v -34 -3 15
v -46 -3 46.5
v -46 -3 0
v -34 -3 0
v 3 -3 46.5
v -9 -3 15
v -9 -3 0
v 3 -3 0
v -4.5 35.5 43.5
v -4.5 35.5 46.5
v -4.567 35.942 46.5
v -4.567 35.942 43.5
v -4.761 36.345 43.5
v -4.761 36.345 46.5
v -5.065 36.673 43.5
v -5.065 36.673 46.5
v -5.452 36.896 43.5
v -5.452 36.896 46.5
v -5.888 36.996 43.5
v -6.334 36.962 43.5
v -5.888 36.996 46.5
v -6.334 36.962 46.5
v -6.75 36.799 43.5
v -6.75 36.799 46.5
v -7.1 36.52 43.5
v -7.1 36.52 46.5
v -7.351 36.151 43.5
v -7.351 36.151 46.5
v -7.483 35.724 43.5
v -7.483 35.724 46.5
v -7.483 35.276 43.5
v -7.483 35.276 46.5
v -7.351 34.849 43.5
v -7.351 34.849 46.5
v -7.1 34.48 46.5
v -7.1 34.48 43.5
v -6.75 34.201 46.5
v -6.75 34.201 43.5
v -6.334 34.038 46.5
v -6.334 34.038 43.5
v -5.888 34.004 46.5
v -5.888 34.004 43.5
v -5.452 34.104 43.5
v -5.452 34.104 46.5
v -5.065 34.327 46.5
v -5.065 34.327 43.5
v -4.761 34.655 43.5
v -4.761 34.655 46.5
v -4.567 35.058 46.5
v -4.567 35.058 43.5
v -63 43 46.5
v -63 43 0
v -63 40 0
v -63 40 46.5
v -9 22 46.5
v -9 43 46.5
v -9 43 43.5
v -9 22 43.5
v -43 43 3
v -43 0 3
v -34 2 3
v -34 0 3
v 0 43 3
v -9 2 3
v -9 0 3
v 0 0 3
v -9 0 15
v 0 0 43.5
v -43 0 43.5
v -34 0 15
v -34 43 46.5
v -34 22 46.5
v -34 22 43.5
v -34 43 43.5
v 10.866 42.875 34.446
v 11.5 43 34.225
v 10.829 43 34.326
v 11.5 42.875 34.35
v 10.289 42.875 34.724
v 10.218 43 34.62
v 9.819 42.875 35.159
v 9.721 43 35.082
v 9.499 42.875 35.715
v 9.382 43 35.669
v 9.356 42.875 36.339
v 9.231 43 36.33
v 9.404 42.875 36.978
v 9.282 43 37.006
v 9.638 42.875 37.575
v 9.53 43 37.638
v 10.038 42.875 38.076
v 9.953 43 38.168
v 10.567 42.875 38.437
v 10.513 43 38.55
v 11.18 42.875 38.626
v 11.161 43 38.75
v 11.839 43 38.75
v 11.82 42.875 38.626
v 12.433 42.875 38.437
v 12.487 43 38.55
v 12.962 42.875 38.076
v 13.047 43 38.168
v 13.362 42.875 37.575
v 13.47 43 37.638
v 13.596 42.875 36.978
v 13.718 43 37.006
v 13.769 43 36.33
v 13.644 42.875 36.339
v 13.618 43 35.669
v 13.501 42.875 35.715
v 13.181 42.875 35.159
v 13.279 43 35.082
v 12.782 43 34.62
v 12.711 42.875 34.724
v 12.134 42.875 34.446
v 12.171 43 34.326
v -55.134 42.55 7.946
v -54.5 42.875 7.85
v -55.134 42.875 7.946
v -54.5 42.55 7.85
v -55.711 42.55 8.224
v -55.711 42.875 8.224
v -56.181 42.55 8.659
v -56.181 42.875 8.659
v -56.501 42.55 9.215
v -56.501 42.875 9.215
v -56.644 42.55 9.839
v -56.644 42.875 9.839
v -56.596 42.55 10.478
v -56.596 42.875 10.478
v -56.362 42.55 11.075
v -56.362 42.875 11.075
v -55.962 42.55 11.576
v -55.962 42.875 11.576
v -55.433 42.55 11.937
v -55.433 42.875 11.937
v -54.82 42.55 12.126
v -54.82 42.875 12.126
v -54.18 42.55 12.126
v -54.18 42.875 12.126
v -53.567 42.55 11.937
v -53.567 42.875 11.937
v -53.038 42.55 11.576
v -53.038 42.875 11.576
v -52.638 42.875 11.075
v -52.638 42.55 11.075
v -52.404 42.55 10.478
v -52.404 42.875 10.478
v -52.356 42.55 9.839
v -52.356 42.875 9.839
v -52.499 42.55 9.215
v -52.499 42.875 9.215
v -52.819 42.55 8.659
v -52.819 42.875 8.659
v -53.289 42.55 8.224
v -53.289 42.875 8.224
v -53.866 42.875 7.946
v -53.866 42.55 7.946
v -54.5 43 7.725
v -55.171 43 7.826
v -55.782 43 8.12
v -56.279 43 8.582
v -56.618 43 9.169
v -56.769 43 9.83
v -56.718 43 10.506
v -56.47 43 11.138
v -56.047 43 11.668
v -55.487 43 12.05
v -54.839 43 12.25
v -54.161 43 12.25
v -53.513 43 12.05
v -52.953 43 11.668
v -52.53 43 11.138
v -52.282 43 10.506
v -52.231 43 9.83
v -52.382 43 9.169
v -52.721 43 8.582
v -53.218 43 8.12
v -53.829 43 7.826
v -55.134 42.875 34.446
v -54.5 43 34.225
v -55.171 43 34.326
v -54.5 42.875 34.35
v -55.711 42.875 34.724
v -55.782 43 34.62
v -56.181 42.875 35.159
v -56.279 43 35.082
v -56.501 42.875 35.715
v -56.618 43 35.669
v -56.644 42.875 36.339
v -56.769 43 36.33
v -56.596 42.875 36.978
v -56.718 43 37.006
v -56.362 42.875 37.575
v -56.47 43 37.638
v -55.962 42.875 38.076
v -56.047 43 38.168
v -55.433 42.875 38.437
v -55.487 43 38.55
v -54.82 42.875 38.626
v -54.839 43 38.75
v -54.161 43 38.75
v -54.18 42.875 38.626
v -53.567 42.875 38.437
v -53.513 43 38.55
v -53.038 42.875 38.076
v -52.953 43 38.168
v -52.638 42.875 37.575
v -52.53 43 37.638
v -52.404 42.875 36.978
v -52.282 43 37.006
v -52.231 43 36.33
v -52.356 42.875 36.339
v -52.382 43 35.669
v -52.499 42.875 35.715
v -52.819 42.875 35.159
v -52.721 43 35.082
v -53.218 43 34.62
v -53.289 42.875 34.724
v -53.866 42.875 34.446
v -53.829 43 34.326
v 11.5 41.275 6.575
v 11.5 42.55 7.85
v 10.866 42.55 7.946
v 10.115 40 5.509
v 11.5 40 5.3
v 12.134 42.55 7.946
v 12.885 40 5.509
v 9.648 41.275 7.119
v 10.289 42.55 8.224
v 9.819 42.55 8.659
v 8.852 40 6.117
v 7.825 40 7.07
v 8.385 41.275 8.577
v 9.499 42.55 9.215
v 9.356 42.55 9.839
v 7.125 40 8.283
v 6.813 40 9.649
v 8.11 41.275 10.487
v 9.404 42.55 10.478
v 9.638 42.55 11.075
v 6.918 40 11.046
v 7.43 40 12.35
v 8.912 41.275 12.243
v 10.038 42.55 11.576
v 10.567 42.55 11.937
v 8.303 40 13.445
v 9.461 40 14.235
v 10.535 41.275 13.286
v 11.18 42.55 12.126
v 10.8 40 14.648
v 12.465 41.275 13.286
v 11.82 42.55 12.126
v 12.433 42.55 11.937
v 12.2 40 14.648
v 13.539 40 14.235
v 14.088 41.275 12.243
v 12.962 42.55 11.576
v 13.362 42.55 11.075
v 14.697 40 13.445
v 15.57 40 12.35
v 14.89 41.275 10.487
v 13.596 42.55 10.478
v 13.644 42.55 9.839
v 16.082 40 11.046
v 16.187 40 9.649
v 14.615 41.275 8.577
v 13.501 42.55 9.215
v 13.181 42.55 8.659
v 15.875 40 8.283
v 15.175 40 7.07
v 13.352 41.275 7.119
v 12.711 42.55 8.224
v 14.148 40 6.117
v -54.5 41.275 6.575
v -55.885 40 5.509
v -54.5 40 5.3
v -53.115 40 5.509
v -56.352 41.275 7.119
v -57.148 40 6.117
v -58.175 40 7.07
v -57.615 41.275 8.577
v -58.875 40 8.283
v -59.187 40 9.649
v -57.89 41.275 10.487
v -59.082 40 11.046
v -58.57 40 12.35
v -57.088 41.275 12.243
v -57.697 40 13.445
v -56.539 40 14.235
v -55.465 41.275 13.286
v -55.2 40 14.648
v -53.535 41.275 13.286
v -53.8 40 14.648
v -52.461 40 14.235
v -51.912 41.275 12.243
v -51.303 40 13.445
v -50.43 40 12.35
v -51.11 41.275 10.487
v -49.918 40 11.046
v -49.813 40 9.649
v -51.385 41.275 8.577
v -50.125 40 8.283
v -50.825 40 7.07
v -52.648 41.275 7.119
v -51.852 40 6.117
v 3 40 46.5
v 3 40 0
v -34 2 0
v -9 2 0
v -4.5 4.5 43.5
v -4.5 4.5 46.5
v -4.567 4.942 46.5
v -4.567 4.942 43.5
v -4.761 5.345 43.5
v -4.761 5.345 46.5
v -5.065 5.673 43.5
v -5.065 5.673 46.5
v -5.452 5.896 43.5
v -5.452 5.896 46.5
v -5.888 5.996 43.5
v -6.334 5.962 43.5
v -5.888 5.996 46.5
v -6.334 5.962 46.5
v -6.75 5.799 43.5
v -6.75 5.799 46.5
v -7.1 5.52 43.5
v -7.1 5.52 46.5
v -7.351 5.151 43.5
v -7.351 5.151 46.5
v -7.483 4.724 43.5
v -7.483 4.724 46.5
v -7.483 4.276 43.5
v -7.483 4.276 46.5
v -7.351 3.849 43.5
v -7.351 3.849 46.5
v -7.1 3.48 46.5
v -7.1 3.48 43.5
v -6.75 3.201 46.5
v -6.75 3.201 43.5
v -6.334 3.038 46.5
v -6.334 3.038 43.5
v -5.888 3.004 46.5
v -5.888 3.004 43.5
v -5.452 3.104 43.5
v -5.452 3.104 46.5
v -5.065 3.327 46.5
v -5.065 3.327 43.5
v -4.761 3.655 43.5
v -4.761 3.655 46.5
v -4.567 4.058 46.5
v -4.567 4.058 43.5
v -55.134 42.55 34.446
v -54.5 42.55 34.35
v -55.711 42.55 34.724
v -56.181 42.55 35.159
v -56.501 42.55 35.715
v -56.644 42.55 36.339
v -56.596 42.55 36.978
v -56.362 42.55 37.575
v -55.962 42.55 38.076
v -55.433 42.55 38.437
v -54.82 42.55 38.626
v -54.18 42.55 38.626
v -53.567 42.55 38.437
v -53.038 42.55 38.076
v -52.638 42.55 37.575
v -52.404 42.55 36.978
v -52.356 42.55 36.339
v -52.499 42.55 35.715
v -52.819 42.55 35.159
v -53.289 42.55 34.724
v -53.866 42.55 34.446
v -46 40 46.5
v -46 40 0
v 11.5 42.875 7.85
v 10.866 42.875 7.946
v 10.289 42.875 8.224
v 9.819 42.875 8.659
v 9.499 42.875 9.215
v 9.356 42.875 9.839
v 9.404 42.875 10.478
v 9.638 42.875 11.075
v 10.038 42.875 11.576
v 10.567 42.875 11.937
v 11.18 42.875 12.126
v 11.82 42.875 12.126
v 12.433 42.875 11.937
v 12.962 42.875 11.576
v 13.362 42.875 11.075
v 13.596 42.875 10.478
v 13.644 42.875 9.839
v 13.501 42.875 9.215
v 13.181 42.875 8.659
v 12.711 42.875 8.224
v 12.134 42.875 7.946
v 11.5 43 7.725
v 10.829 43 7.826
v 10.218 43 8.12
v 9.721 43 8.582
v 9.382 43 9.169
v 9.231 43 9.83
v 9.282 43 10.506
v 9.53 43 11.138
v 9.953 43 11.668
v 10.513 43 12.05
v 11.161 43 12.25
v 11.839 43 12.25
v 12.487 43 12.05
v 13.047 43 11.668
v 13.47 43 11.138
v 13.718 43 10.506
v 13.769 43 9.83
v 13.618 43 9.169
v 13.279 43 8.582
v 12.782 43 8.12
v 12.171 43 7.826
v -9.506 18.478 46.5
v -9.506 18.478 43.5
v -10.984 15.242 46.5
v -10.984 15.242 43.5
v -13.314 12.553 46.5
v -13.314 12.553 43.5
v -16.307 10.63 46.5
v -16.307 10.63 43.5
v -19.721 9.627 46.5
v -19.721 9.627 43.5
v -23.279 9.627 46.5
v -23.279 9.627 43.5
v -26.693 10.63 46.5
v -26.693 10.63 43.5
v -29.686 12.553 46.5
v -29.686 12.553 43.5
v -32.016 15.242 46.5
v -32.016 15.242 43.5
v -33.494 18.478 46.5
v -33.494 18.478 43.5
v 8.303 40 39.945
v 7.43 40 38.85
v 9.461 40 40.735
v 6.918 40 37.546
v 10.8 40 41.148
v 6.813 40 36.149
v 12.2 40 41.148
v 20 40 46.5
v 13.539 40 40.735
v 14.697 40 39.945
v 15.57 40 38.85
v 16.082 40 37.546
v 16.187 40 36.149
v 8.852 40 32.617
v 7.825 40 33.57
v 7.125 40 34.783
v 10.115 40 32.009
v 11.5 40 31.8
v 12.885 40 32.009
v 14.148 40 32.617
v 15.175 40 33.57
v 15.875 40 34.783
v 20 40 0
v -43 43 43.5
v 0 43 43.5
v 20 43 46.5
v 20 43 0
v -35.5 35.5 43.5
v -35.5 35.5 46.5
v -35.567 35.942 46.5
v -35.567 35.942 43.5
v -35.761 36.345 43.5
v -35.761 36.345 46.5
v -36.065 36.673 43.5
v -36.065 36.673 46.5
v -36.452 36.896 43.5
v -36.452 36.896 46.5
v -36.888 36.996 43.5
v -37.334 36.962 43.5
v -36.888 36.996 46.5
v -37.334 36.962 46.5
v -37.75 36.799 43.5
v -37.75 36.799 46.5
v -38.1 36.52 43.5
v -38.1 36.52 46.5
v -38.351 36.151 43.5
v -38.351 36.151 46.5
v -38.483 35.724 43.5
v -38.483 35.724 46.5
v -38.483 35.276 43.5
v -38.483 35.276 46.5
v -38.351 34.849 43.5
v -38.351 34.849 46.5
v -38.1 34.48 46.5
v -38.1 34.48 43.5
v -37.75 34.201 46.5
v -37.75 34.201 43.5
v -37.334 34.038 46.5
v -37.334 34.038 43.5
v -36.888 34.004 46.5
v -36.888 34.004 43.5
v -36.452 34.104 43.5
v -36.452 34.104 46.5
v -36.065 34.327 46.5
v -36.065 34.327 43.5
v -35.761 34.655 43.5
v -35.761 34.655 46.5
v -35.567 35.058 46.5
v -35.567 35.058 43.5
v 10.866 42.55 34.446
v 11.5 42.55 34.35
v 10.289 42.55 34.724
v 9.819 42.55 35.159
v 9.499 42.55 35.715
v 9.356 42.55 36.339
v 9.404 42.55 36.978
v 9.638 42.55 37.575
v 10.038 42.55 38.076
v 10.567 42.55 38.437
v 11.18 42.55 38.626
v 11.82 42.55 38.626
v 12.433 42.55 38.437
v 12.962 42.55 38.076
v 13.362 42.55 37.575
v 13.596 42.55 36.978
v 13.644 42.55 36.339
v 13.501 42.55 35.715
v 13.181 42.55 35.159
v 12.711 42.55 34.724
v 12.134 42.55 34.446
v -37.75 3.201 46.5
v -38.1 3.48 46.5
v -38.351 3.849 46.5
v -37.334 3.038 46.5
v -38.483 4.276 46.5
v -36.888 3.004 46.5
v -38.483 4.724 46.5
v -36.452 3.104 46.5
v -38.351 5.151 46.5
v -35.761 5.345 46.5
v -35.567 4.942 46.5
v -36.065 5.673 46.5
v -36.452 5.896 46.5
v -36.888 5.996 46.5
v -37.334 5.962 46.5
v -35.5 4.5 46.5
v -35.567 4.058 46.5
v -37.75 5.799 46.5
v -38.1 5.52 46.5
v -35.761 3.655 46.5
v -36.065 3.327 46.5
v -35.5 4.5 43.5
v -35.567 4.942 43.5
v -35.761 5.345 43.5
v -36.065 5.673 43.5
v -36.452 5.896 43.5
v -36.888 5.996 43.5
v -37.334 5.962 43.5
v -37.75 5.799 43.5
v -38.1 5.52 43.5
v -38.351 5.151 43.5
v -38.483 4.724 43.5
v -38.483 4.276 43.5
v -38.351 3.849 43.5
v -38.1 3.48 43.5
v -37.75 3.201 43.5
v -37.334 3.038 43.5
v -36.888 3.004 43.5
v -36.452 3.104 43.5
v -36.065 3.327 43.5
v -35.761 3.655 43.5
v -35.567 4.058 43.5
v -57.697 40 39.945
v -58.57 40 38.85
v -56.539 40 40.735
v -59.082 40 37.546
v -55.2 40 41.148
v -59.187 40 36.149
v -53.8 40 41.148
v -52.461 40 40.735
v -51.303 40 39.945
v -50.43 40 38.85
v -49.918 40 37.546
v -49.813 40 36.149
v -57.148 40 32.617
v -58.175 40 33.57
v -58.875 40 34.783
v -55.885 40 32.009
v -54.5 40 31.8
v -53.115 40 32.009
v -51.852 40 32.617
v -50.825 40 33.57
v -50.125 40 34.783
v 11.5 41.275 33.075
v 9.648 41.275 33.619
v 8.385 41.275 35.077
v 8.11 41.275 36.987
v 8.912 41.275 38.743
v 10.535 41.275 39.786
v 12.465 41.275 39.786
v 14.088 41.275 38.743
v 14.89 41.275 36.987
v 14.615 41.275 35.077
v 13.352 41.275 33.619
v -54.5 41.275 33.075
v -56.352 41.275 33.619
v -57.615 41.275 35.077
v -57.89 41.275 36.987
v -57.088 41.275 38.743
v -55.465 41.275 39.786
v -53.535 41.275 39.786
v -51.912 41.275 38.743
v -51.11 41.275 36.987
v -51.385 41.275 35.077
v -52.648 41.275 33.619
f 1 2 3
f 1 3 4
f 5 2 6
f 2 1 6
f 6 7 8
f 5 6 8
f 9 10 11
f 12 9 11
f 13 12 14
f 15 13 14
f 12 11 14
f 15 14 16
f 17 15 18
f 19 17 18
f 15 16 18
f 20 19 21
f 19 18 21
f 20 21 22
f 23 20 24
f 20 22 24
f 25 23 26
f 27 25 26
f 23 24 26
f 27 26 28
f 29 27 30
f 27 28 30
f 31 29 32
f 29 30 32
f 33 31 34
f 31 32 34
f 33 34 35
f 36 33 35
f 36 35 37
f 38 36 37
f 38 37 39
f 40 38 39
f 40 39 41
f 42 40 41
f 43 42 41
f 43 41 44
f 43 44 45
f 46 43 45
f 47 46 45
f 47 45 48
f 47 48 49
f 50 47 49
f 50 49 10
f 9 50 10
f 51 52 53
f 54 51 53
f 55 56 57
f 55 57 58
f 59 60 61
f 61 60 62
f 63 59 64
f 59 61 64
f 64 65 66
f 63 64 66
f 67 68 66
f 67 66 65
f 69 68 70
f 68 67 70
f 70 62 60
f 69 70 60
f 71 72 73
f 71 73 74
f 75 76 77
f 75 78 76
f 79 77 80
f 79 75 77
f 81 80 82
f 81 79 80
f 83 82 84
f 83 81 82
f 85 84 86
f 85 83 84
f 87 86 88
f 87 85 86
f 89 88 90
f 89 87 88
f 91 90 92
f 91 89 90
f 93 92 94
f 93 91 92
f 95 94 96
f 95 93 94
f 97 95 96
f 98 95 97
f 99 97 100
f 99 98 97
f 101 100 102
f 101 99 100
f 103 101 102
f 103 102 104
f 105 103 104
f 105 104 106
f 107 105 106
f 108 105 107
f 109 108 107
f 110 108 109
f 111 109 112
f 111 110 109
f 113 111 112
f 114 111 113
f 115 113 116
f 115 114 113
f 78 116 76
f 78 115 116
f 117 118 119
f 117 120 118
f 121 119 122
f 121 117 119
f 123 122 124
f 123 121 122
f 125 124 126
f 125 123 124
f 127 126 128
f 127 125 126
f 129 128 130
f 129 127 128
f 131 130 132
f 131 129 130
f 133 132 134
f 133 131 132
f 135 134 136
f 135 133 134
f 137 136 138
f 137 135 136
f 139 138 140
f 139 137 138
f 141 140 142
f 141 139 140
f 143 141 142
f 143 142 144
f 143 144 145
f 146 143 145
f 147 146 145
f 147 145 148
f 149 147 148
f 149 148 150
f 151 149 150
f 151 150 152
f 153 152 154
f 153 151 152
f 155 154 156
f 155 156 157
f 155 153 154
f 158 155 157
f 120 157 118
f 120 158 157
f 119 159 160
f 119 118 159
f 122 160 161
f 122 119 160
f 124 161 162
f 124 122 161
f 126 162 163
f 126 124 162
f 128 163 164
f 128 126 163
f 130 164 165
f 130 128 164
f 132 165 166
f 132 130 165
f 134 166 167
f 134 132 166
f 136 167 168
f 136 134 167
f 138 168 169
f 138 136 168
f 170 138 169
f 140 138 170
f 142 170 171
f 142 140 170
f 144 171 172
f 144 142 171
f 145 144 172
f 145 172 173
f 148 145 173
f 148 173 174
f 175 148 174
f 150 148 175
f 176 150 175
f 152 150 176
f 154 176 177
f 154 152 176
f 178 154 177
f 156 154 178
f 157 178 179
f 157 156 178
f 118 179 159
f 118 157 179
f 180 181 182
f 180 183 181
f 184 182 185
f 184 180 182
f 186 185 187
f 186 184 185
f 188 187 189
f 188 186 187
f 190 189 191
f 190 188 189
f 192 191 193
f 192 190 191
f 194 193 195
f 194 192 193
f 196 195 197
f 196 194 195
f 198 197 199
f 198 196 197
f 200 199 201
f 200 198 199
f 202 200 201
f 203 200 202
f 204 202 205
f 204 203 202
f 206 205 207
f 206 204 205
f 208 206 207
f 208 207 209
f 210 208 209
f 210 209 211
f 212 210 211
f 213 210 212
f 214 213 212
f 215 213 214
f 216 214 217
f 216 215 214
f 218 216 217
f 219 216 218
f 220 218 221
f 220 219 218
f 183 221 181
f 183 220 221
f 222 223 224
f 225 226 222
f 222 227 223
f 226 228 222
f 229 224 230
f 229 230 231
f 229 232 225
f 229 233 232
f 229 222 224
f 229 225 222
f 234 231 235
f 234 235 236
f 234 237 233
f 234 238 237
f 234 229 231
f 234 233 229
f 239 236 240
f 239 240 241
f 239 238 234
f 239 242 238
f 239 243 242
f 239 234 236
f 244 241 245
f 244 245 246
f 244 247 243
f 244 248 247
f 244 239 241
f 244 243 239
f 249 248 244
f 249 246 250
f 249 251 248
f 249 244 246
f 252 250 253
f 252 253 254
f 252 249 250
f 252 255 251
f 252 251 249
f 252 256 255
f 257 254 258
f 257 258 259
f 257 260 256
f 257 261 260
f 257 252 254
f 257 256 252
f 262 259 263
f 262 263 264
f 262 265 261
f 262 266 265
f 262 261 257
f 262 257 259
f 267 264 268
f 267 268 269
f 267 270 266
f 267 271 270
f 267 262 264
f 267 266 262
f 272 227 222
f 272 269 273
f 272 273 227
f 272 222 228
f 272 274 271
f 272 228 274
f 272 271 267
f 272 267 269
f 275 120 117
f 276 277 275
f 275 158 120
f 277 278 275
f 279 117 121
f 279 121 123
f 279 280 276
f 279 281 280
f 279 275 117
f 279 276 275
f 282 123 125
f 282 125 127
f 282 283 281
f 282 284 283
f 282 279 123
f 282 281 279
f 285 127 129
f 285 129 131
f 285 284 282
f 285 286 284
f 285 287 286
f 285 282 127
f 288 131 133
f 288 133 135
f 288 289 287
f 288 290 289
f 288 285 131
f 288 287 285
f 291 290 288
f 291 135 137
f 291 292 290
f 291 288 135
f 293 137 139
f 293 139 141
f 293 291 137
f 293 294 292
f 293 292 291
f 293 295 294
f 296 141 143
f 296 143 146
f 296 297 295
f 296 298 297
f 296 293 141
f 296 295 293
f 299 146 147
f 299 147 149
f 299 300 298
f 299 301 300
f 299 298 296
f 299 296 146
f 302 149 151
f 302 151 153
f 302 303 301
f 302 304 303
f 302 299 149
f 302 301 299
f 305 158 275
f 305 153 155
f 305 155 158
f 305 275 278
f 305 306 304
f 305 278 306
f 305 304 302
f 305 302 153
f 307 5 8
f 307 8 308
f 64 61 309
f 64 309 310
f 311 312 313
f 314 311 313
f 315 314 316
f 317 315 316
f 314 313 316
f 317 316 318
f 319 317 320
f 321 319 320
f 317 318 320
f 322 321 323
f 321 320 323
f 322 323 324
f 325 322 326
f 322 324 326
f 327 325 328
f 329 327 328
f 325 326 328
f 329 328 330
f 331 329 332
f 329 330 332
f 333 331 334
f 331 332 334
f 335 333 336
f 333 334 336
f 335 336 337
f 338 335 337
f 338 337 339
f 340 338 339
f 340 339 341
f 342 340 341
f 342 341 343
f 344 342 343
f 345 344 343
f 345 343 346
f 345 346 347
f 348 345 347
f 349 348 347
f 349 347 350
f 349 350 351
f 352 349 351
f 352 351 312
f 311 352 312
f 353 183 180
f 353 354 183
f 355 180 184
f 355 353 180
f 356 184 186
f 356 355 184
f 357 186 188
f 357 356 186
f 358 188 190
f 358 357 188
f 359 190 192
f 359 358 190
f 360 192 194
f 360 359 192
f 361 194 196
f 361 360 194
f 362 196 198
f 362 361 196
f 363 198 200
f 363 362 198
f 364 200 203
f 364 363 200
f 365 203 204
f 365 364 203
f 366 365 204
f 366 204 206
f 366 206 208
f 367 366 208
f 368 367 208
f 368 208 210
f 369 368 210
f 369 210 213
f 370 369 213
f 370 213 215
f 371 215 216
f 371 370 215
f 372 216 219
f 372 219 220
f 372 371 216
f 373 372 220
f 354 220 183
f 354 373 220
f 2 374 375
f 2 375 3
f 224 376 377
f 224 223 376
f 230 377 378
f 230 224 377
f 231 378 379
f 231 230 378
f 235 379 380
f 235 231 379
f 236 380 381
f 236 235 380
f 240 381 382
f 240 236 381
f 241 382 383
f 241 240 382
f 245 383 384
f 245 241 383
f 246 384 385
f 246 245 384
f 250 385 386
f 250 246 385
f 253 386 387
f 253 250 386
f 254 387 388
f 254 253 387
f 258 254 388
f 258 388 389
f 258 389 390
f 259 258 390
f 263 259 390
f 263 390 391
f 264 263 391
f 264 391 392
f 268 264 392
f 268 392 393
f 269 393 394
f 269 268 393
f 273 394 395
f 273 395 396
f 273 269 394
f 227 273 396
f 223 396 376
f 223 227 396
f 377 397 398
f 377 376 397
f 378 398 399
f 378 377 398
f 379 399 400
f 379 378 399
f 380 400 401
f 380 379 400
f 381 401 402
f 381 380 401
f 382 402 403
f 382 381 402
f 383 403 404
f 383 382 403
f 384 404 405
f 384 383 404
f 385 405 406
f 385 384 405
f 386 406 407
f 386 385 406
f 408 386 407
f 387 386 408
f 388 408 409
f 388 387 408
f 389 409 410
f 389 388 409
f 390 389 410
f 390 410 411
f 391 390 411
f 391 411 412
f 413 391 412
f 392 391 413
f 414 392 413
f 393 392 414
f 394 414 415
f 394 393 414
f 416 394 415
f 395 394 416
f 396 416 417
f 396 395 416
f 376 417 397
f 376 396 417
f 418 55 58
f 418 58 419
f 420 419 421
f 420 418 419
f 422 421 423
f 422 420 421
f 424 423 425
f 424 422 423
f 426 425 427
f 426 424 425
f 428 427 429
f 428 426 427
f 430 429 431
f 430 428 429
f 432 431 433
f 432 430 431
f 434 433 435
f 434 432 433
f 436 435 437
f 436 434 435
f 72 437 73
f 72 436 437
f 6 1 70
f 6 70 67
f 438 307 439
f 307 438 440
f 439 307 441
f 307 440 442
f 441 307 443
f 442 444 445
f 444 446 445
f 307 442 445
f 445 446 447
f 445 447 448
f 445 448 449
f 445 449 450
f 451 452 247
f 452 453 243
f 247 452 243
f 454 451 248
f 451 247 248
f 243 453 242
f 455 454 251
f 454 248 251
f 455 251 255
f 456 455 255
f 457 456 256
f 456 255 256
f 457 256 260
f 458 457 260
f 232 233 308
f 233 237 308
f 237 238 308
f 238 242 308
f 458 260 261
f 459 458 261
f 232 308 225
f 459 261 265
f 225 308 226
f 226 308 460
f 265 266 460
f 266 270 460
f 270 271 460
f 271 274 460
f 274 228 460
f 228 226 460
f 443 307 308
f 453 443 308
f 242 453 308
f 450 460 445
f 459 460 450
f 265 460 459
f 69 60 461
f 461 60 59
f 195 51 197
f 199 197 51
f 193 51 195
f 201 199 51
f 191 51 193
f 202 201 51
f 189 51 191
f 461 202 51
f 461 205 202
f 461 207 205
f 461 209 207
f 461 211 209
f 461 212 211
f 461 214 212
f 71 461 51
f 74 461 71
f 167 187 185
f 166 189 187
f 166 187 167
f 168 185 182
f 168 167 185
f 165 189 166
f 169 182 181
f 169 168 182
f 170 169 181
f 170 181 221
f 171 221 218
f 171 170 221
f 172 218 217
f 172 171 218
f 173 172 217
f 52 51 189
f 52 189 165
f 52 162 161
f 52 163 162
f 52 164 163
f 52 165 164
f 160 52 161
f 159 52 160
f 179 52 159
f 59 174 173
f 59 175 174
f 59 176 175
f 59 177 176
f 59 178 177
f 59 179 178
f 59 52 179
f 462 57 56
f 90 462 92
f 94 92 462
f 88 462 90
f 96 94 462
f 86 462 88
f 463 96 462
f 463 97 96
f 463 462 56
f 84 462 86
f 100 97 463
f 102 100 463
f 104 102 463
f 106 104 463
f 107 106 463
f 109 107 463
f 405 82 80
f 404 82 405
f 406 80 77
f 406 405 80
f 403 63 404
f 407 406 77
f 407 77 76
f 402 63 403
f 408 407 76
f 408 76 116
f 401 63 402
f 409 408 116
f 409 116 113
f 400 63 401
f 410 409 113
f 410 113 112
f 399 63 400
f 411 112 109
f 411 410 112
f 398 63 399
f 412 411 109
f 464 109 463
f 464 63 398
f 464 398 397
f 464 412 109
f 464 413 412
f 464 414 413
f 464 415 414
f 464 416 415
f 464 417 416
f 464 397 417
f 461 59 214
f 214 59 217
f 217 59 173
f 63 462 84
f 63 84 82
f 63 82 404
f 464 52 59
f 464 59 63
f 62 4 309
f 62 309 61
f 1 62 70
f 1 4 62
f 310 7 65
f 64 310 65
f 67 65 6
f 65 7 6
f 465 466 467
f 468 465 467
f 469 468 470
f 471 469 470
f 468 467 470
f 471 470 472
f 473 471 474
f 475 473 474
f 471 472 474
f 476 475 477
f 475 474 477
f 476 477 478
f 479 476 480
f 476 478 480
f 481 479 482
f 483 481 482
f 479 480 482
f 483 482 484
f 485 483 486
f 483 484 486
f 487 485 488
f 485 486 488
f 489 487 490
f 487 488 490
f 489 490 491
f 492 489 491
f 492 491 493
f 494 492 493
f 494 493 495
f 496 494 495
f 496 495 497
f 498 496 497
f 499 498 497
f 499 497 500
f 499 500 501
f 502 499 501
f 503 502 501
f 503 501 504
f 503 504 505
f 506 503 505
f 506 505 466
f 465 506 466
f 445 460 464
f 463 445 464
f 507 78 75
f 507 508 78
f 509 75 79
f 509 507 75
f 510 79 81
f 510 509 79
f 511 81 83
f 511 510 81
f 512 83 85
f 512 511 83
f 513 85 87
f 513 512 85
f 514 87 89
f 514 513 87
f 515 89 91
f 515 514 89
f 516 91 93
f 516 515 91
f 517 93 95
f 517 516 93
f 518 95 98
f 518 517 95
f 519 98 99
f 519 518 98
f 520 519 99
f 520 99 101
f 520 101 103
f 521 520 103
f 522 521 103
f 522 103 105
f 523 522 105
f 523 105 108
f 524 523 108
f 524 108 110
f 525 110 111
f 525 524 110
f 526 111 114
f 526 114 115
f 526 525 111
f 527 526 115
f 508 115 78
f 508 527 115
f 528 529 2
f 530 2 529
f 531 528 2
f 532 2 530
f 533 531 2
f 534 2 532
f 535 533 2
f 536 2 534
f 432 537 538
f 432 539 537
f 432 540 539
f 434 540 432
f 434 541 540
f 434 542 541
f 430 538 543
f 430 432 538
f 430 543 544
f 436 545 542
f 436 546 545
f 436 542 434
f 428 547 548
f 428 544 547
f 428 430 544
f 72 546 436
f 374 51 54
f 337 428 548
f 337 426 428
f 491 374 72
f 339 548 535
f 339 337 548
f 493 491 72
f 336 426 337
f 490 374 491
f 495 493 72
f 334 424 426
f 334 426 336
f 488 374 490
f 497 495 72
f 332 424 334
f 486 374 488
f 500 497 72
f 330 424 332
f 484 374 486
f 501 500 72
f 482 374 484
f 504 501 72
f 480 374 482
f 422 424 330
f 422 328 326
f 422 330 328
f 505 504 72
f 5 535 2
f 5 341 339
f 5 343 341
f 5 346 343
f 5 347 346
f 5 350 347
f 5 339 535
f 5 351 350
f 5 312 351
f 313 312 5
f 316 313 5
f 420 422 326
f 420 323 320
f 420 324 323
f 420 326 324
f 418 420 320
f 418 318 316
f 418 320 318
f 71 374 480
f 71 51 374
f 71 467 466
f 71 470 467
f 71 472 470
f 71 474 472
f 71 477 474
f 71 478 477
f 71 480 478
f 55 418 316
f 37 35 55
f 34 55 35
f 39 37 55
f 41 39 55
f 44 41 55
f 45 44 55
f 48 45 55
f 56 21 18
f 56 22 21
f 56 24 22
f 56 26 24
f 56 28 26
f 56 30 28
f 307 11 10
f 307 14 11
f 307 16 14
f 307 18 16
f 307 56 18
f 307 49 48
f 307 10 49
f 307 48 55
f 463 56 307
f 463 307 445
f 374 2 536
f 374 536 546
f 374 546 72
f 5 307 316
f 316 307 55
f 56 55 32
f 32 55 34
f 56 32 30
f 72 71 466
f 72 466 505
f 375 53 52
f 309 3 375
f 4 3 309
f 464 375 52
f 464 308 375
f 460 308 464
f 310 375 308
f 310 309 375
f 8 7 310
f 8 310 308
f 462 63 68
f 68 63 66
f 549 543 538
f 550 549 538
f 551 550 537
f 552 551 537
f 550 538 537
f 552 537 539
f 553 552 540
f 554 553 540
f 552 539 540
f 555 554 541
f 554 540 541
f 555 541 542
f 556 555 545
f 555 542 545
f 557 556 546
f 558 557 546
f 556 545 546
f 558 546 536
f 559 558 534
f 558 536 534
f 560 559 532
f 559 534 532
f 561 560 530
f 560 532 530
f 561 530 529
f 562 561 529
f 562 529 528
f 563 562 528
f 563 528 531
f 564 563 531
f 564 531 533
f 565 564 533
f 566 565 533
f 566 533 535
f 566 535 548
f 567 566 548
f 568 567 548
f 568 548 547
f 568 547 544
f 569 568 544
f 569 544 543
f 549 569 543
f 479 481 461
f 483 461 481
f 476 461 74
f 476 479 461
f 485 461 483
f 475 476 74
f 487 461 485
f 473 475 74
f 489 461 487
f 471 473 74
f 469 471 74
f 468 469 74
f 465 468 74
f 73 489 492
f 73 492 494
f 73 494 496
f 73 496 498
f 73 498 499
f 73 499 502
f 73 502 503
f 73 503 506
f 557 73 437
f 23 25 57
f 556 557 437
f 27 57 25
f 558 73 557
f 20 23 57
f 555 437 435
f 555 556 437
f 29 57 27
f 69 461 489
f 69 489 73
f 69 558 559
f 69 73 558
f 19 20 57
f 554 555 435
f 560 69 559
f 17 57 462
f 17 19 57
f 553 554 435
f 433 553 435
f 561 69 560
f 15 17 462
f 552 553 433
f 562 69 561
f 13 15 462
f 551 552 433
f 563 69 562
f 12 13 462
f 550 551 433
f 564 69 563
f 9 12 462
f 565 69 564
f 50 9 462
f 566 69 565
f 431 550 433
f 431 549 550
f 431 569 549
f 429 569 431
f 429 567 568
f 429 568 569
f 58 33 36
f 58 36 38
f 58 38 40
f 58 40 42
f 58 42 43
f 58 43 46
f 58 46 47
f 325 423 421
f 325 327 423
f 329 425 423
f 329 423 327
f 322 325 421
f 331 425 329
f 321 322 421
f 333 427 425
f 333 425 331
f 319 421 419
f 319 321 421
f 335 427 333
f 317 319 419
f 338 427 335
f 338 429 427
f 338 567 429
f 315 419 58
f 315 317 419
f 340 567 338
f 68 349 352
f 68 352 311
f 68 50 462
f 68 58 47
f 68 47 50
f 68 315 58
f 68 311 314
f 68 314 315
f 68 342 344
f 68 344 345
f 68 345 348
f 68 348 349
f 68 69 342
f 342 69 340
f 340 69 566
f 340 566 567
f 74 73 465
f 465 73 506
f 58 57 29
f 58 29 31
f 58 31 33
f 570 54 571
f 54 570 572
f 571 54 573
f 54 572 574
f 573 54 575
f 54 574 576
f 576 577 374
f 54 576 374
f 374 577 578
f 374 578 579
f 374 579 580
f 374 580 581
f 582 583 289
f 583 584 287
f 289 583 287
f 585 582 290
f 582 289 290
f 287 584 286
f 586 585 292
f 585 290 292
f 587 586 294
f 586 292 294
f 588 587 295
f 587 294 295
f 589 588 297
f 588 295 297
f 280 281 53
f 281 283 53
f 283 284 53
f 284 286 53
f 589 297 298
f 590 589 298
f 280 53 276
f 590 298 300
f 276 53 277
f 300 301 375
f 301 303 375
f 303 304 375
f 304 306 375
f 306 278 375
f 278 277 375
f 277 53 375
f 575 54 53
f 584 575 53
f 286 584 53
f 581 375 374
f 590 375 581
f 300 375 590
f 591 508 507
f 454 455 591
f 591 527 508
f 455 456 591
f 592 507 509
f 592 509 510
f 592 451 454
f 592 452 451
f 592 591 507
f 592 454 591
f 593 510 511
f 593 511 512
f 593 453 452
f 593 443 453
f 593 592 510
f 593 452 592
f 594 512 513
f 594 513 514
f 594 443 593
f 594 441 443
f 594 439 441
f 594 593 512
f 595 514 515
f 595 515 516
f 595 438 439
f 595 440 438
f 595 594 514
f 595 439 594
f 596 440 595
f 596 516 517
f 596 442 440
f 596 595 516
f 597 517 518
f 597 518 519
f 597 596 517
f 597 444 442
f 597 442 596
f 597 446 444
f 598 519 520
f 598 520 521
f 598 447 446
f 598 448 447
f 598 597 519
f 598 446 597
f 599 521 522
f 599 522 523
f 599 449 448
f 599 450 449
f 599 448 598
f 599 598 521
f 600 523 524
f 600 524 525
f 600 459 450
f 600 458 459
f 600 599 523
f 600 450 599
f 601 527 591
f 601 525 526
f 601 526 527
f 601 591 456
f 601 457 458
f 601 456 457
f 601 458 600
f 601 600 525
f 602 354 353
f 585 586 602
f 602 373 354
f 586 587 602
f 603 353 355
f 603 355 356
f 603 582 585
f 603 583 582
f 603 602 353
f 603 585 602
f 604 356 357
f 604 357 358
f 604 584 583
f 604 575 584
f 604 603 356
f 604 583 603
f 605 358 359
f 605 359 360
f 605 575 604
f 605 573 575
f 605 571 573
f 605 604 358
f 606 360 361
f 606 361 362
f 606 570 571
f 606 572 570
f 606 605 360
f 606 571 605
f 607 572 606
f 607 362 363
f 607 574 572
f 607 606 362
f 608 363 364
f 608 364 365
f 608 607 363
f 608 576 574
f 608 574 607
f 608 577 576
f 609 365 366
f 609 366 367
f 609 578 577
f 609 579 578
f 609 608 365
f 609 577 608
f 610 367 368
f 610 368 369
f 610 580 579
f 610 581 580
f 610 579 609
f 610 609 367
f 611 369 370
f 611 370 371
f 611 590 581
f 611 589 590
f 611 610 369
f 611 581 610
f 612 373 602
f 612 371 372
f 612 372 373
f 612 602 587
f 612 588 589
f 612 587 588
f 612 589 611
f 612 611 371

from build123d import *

# Parameters (mm, degrees)
EXTRU_MINCE1_DEPTH                          = 46.5
ESQUISSE2_W                                 = 43
ESQUISSE2_H                                 = 3
BOSS_EXTRU_1_DEPTH                          = 43
ENL_V_MAT_EXTRU_1_REACH                     = 48.5
ESQUISSE3_R                                 = 1.5
FRAISAGE_POUR_VIS_T_TE_FRAIS_E_M41_AT_COUNT = 2
FRAISAGE_POUR_VIS_T_TE_FRAIS_E_M41_AT_PITCH = 71.121375127
FRAISAGE_POUR_VIS_T_TE_FRAIS_E_M41_2_COUNT  = 2
FRAISAGE_POUR_VIS_T_TE_FRAIS_E_M41_2_PITCH  = 66
FRAISAGE_POUR_VIS_T_TE_FRAIS_E_M41_3_COUNT  = 2
FRAISAGE_POUR_VIS_T_TE_FRAIS_E_M41_3_PITCH  = 26.5
ESQUISSE6_W                                 = 25
ESQUISSE6_H                                 = 15
ENL_V_MAT_EXTRU_2_DEPTH                     = 5


with BuildPart() as part:
    # Esquisse1 → Extru.-Mince1 (new body)
    with BuildSketch(Plane.XY):
        Polygon((20, 43), (0, 43), (0, 0), (-43, 0), (-43, 43), (-63, 43), (-63, 40), (-46, 40), (-46, -3), (3, -3), (3, 40), (20, 40), align=None)
    extrude(amount=EXTRU_MINCE1_DEPTH)

    # Esquisse2 → Boss.-Extru.1 (add)
    with BuildSketch(Plane(origin=(0, 0, 0), x_dir=(1, 0, 0), z_dir=(0, 1, 0))):
        with Locations((-21.5, -1.5)):
            Rectangle(ESQUISSE2_W, ESQUISSE2_H)
        with Locations((-21.5, -45)):
            Rectangle(ESQUISSE2_W, ESQUISSE2_H)
    extrude(amount=BOSS_EXTRU_1_DEPTH)

    # Esquisse3 → Enlèv. mat.-Extru.1 (cut, up to next)
    with BuildSketch(Plane.XY.offset(46.5), mode=Mode.PRIVATE) as enl_v_mat_extru_1_sk1:
        with Locations((-37, 4.5)):
            Circle(ESQUISSE3_R)
    enl_v_mat_extru_1_tool1 = extrude(enl_v_mat_extru_1_sk1.sketch, amount=-ENL_V_MAT_EXTRU_1_REACH, mode=Mode.PRIVATE) & part.part
    add(enl_v_mat_extru_1_tool1.solids().sort_by_distance((-37, 4.5, 46.5))[0], mode=Mode.SUBTRACT)
    # Esquisse3 → Enlèv. mat.-Extru.1 (cut, up to next)
    with BuildSketch(Plane.XY.offset(46.5), mode=Mode.PRIVATE) as enl_v_mat_extru_1_sk2:
        with Locations((-37, 35.5)):
            Circle(ESQUISSE3_R)
    enl_v_mat_extru_1_tool2 = extrude(enl_v_mat_extru_1_sk2.sketch, amount=-ENL_V_MAT_EXTRU_1_REACH, mode=Mode.PRIVATE) & part.part
    add(enl_v_mat_extru_1_tool2.solids().sort_by_distance((-37, 35.5, 46.5))[0], mode=Mode.SUBTRACT)
    # Esquisse3 → Enlèv. mat.-Extru.1 (cut, up to next)
    with BuildSketch(Plane.XY.offset(46.5), mode=Mode.PRIVATE) as enl_v_mat_extru_1_sk3:
        with Locations((-6, 35.5)):
            Circle(ESQUISSE3_R)
    enl_v_mat_extru_1_tool3 = extrude(enl_v_mat_extru_1_sk3.sketch, amount=-ENL_V_MAT_EXTRU_1_REACH, mode=Mode.PRIVATE) & part.part
    add(enl_v_mat_extru_1_tool3.solids().sort_by_distance((-6, 35.5, 46.5))[0], mode=Mode.SUBTRACT)
    # Esquisse3 → Enlèv. mat.-Extru.1 (cut, up to next)
    with BuildSketch(Plane.XY.offset(46.5), mode=Mode.PRIVATE) as enl_v_mat_extru_1_sk4:
        with Locations((-6, 4.5)):
            Circle(ESQUISSE3_R)
    enl_v_mat_extru_1_tool4 = extrude(enl_v_mat_extru_1_sk4.sketch, amount=-ENL_V_MAT_EXTRU_1_REACH, mode=Mode.PRIVATE) & part.part
    add(enl_v_mat_extru_1_tool4.solids().sort_by_distance((-6, 4.5, 46.5))[0], mode=Mode.SUBTRACT)
    # Esquisse3 → Enlèv. mat.-Extru.1 (cut, up to next)
    with BuildSketch(Plane.XY.offset(46.5), mode=Mode.PRIVATE) as enl_v_mat_extru_1_sk5:
        with BuildLine():
            Line((-34, 43), (-9, 43))
            Line((-9, 43), (-9, 22))
            ThreePointArc((-9, 22), (-21.5, 9.5), (-34, 22))
            Line((-34, 22), (-34, 43))
        make_face()
    enl_v_mat_extru_1_tool5 = extrude(enl_v_mat_extru_1_sk5.sketch, amount=-ENL_V_MAT_EXTRU_1_REACH, mode=Mode.PRIVATE) & part.part
    add(enl_v_mat_extru_1_tool5.solids().sort_by_distance((-21.5, 27.464973, 46.5))[0], mode=Mode.SUBTRACT)

    # Esquisse5 → Fraisage pour vis à tête fraisée M41 (revolve, cut)
    with BuildSketch(Plane(origin=(-54.5, 40, 36.5), x_dir=(0, 0, -1), z_dir=(1, 0, 0))):
        Polygon((0, 0), (0, 3), (2.275, 3), (2.15, 2.875), (2.15, 2.55), (4.7, 0), align=None)
    fraisage_pour_vis_t_te_frais_e_m41 = revolve(axis=Axis((-54.5, 33.65, 36.5), (0, 1, 0)), mode=Mode.SUBTRACT)

    # Fraisage pour vis à tête fraisée M41 at: Fraisage pour vis à tête fraisée M41 ×2
    with Locations(*[Vector(0.927991056, 0, -0.372602469) * (i * FRAISAGE_POUR_VIS_T_TE_FRAIS_E_M41_AT_PITCH) for i in range(1, FRAISAGE_POUR_VIS_T_TE_FRAIS_E_M41_AT_COUNT)]):
        add(fraisage_pour_vis_t_te_frais_e_m41, mode=Mode.SUBTRACT)

    # Fraisage pour vis _ t_te frais_e M41 2: Fraisage pour vis à tête fraisée M41 ×2
    with Locations(*[(i * FRAISAGE_POUR_VIS_T_TE_FRAIS_E_M41_2_PITCH, 0, 0) for i in range(1, FRAISAGE_POUR_VIS_T_TE_FRAIS_E_M41_2_COUNT)]):
        add(fraisage_pour_vis_t_te_frais_e_m41, mode=Mode.SUBTRACT)

    # Fraisage pour vis _ t_te frais_e M41 3: Fraisage pour vis à tête fraisée M41 ×2
    with Locations(*[(0, 0, -i * FRAISAGE_POUR_VIS_T_TE_FRAIS_E_M41_3_PITCH) for i in range(1, FRAISAGE_POUR_VIS_T_TE_FRAIS_E_M41_3_COUNT)]):
        add(fraisage_pour_vis_t_te_frais_e_m41, mode=Mode.SUBTRACT)

    # Esquisse6 → Enlèv. mat.-Extru.2 (cut)
    with BuildSketch(Plane.XZ.offset(3)):
        with Locations((-21.5, 7.5)):
            Rectangle(ESQUISSE6_W, ESQUISSE6_H)
    extrude(amount=-ENL_V_MAT_EXTRU_2_DEPTH, mode=Mode.SUBTRACT)


solid = part.part
